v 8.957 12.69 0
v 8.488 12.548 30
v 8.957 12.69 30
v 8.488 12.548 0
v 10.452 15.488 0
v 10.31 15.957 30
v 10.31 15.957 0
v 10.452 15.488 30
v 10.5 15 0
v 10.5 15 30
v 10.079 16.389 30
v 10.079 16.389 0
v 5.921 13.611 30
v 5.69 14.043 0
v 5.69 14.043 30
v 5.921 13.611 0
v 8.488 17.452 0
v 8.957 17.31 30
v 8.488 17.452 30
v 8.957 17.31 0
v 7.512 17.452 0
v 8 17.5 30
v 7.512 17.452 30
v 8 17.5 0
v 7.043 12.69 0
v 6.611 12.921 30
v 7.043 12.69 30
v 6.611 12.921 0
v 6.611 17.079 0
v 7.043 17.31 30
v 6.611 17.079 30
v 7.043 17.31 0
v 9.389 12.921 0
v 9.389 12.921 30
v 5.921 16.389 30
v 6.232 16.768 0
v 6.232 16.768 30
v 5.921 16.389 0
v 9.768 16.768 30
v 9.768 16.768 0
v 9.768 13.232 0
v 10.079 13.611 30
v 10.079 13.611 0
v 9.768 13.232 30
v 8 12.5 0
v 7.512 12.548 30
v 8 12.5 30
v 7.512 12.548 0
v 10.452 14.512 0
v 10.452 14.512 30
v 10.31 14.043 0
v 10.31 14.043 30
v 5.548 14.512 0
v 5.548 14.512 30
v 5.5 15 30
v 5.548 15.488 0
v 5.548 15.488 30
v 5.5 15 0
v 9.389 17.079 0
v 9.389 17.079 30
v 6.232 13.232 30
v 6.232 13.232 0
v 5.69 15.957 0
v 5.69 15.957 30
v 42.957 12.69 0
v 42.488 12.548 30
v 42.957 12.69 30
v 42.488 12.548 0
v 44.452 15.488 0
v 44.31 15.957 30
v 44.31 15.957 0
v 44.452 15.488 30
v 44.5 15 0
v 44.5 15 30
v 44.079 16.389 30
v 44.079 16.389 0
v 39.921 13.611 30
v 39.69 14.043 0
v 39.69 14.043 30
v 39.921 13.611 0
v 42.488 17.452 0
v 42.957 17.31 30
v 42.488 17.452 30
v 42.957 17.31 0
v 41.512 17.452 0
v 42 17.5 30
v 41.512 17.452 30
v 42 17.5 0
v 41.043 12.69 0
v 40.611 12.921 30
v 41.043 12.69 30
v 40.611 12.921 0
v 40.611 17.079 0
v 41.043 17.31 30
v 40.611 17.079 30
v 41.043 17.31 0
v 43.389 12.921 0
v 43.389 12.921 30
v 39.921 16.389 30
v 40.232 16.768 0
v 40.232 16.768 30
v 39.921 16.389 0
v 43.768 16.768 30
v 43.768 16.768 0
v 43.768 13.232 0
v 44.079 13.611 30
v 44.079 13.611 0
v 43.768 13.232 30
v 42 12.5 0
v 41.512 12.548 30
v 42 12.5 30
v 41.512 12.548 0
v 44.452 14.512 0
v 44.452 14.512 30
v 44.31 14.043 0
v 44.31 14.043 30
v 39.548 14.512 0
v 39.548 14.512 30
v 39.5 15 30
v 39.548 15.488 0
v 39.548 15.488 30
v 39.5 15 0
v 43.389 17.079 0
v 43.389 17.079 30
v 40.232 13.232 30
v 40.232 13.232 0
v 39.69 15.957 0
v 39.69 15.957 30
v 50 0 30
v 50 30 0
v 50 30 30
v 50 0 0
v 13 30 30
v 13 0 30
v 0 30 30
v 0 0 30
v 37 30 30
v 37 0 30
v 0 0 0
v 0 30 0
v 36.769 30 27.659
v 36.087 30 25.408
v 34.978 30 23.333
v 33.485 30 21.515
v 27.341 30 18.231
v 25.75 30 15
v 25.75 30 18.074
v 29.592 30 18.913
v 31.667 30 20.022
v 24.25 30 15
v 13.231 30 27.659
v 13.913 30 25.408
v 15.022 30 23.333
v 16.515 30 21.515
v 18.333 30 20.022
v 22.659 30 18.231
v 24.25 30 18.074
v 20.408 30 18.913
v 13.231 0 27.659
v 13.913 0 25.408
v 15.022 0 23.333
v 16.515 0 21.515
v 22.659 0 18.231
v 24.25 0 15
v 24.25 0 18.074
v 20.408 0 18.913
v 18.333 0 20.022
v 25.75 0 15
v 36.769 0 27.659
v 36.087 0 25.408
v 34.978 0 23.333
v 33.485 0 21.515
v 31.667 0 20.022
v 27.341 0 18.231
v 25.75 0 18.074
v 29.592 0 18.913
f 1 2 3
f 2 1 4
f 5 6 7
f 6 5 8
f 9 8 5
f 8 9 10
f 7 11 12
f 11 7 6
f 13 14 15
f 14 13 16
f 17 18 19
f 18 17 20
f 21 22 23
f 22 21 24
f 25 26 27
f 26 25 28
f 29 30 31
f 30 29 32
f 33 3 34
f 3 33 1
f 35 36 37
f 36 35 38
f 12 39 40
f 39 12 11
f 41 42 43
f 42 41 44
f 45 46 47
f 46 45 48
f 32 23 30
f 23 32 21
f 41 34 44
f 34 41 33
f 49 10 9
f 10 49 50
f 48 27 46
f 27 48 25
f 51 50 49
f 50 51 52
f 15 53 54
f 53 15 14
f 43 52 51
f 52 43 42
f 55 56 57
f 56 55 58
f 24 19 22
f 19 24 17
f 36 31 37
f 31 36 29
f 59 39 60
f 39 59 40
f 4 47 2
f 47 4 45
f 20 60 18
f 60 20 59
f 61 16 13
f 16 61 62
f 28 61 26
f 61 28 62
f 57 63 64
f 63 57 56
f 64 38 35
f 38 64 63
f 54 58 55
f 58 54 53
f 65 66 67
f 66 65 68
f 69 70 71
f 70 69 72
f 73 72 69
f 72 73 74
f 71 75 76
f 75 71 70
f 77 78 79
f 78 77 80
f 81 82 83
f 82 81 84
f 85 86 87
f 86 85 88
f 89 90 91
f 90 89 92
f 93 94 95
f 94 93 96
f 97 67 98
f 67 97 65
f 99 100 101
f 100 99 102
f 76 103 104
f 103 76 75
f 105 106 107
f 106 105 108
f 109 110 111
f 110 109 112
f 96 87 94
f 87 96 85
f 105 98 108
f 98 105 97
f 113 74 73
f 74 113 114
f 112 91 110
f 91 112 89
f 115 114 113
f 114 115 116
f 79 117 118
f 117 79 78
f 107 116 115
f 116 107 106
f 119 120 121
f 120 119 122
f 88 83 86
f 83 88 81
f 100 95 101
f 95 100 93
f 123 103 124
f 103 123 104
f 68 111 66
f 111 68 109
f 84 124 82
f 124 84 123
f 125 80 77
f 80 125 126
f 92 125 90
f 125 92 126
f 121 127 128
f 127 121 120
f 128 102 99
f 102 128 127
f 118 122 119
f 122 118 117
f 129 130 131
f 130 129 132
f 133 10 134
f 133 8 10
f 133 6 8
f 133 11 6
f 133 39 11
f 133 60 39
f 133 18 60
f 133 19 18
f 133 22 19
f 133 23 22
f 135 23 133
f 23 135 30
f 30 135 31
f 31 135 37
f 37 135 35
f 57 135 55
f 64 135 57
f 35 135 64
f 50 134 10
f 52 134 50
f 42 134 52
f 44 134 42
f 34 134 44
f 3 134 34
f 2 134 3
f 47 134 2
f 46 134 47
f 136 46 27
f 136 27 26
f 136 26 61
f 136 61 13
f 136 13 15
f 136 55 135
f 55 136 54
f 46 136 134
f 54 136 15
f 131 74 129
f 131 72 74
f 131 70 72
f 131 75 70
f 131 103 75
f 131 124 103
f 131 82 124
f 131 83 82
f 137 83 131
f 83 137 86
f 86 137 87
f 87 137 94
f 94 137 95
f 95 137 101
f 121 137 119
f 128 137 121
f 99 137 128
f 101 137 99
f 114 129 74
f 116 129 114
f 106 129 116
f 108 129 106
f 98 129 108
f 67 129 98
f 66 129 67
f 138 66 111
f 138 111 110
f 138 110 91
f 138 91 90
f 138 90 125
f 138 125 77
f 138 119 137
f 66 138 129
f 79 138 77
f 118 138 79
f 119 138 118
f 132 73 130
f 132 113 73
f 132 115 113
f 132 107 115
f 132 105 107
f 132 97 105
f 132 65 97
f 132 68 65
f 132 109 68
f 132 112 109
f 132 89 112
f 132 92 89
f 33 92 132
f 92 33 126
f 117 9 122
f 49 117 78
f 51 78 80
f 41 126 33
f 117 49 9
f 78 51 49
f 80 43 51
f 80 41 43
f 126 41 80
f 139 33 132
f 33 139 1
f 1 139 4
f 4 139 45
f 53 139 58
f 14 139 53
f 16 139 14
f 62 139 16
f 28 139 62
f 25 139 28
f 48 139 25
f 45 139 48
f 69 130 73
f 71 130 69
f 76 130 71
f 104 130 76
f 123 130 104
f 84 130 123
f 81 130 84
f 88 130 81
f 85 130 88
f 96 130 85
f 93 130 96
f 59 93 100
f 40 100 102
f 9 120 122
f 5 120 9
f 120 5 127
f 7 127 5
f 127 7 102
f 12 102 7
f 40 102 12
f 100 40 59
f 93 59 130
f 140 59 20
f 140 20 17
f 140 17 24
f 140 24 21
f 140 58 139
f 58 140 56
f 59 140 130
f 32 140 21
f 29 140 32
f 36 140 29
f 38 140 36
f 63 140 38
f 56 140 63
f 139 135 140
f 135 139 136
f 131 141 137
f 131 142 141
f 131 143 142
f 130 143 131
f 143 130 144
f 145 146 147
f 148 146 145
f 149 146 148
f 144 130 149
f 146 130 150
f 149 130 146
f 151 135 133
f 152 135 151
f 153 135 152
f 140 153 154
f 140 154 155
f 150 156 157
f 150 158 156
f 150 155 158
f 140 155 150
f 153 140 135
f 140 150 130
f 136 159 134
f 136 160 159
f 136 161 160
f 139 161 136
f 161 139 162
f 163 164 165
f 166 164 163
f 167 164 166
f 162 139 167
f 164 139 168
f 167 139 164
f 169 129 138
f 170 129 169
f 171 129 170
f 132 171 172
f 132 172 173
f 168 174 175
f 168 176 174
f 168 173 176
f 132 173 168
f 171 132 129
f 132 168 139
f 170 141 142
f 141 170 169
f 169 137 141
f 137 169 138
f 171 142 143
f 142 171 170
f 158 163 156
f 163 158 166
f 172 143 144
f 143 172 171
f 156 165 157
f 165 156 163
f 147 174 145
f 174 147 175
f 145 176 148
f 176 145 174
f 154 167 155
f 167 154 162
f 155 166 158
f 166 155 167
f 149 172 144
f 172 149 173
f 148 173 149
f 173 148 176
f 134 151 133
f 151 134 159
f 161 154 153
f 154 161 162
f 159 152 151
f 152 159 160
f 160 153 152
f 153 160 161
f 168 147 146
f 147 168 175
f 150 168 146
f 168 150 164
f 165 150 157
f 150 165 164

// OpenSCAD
$fn = 32;

// ----------------------------------------------------------------------
// Saddle clamp: split shaft clamp
// ----------------------------------------------------------------------

// --- parameters (mm) ---
blk_l = 50;               // block length, X
blk_w = 30;               // block width, Y
blk_h = 30;               // block height
clamp_r = 12;             // shaft groove radius
hole_r = 2.5;             // bolt hole radius
hole_m = 8;               // bolt hole margin from the ends
saw_w = 1.5;              // saw kerf width
fit_tol = 0.1;            // tolerance for press fits, mm
free_tol = 0.3;           // tolerance for clearance fits, mm

saw_depth = clamp_r + 3;  // saw kerf depth

difference() {
  cube([blk_l, blk_w, blk_h]);
  translate([blk_l / 2, -1, blk_h])
    rotate([-90, 0, 0])
      cylinder(h = blk_w + 2, r = clamp_r);
  for (sx = [0, 1])
    translate([sx ? blk_l - hole_m : hole_m, blk_w / 2, -1])
      cylinder(r = hole_r, h = blk_h + 2);
  translate([blk_l / 2 - saw_w / 2, -1, blk_h - saw_depth])
    cube([saw_w, blk_w + 2, saw_depth + 1]);
}
